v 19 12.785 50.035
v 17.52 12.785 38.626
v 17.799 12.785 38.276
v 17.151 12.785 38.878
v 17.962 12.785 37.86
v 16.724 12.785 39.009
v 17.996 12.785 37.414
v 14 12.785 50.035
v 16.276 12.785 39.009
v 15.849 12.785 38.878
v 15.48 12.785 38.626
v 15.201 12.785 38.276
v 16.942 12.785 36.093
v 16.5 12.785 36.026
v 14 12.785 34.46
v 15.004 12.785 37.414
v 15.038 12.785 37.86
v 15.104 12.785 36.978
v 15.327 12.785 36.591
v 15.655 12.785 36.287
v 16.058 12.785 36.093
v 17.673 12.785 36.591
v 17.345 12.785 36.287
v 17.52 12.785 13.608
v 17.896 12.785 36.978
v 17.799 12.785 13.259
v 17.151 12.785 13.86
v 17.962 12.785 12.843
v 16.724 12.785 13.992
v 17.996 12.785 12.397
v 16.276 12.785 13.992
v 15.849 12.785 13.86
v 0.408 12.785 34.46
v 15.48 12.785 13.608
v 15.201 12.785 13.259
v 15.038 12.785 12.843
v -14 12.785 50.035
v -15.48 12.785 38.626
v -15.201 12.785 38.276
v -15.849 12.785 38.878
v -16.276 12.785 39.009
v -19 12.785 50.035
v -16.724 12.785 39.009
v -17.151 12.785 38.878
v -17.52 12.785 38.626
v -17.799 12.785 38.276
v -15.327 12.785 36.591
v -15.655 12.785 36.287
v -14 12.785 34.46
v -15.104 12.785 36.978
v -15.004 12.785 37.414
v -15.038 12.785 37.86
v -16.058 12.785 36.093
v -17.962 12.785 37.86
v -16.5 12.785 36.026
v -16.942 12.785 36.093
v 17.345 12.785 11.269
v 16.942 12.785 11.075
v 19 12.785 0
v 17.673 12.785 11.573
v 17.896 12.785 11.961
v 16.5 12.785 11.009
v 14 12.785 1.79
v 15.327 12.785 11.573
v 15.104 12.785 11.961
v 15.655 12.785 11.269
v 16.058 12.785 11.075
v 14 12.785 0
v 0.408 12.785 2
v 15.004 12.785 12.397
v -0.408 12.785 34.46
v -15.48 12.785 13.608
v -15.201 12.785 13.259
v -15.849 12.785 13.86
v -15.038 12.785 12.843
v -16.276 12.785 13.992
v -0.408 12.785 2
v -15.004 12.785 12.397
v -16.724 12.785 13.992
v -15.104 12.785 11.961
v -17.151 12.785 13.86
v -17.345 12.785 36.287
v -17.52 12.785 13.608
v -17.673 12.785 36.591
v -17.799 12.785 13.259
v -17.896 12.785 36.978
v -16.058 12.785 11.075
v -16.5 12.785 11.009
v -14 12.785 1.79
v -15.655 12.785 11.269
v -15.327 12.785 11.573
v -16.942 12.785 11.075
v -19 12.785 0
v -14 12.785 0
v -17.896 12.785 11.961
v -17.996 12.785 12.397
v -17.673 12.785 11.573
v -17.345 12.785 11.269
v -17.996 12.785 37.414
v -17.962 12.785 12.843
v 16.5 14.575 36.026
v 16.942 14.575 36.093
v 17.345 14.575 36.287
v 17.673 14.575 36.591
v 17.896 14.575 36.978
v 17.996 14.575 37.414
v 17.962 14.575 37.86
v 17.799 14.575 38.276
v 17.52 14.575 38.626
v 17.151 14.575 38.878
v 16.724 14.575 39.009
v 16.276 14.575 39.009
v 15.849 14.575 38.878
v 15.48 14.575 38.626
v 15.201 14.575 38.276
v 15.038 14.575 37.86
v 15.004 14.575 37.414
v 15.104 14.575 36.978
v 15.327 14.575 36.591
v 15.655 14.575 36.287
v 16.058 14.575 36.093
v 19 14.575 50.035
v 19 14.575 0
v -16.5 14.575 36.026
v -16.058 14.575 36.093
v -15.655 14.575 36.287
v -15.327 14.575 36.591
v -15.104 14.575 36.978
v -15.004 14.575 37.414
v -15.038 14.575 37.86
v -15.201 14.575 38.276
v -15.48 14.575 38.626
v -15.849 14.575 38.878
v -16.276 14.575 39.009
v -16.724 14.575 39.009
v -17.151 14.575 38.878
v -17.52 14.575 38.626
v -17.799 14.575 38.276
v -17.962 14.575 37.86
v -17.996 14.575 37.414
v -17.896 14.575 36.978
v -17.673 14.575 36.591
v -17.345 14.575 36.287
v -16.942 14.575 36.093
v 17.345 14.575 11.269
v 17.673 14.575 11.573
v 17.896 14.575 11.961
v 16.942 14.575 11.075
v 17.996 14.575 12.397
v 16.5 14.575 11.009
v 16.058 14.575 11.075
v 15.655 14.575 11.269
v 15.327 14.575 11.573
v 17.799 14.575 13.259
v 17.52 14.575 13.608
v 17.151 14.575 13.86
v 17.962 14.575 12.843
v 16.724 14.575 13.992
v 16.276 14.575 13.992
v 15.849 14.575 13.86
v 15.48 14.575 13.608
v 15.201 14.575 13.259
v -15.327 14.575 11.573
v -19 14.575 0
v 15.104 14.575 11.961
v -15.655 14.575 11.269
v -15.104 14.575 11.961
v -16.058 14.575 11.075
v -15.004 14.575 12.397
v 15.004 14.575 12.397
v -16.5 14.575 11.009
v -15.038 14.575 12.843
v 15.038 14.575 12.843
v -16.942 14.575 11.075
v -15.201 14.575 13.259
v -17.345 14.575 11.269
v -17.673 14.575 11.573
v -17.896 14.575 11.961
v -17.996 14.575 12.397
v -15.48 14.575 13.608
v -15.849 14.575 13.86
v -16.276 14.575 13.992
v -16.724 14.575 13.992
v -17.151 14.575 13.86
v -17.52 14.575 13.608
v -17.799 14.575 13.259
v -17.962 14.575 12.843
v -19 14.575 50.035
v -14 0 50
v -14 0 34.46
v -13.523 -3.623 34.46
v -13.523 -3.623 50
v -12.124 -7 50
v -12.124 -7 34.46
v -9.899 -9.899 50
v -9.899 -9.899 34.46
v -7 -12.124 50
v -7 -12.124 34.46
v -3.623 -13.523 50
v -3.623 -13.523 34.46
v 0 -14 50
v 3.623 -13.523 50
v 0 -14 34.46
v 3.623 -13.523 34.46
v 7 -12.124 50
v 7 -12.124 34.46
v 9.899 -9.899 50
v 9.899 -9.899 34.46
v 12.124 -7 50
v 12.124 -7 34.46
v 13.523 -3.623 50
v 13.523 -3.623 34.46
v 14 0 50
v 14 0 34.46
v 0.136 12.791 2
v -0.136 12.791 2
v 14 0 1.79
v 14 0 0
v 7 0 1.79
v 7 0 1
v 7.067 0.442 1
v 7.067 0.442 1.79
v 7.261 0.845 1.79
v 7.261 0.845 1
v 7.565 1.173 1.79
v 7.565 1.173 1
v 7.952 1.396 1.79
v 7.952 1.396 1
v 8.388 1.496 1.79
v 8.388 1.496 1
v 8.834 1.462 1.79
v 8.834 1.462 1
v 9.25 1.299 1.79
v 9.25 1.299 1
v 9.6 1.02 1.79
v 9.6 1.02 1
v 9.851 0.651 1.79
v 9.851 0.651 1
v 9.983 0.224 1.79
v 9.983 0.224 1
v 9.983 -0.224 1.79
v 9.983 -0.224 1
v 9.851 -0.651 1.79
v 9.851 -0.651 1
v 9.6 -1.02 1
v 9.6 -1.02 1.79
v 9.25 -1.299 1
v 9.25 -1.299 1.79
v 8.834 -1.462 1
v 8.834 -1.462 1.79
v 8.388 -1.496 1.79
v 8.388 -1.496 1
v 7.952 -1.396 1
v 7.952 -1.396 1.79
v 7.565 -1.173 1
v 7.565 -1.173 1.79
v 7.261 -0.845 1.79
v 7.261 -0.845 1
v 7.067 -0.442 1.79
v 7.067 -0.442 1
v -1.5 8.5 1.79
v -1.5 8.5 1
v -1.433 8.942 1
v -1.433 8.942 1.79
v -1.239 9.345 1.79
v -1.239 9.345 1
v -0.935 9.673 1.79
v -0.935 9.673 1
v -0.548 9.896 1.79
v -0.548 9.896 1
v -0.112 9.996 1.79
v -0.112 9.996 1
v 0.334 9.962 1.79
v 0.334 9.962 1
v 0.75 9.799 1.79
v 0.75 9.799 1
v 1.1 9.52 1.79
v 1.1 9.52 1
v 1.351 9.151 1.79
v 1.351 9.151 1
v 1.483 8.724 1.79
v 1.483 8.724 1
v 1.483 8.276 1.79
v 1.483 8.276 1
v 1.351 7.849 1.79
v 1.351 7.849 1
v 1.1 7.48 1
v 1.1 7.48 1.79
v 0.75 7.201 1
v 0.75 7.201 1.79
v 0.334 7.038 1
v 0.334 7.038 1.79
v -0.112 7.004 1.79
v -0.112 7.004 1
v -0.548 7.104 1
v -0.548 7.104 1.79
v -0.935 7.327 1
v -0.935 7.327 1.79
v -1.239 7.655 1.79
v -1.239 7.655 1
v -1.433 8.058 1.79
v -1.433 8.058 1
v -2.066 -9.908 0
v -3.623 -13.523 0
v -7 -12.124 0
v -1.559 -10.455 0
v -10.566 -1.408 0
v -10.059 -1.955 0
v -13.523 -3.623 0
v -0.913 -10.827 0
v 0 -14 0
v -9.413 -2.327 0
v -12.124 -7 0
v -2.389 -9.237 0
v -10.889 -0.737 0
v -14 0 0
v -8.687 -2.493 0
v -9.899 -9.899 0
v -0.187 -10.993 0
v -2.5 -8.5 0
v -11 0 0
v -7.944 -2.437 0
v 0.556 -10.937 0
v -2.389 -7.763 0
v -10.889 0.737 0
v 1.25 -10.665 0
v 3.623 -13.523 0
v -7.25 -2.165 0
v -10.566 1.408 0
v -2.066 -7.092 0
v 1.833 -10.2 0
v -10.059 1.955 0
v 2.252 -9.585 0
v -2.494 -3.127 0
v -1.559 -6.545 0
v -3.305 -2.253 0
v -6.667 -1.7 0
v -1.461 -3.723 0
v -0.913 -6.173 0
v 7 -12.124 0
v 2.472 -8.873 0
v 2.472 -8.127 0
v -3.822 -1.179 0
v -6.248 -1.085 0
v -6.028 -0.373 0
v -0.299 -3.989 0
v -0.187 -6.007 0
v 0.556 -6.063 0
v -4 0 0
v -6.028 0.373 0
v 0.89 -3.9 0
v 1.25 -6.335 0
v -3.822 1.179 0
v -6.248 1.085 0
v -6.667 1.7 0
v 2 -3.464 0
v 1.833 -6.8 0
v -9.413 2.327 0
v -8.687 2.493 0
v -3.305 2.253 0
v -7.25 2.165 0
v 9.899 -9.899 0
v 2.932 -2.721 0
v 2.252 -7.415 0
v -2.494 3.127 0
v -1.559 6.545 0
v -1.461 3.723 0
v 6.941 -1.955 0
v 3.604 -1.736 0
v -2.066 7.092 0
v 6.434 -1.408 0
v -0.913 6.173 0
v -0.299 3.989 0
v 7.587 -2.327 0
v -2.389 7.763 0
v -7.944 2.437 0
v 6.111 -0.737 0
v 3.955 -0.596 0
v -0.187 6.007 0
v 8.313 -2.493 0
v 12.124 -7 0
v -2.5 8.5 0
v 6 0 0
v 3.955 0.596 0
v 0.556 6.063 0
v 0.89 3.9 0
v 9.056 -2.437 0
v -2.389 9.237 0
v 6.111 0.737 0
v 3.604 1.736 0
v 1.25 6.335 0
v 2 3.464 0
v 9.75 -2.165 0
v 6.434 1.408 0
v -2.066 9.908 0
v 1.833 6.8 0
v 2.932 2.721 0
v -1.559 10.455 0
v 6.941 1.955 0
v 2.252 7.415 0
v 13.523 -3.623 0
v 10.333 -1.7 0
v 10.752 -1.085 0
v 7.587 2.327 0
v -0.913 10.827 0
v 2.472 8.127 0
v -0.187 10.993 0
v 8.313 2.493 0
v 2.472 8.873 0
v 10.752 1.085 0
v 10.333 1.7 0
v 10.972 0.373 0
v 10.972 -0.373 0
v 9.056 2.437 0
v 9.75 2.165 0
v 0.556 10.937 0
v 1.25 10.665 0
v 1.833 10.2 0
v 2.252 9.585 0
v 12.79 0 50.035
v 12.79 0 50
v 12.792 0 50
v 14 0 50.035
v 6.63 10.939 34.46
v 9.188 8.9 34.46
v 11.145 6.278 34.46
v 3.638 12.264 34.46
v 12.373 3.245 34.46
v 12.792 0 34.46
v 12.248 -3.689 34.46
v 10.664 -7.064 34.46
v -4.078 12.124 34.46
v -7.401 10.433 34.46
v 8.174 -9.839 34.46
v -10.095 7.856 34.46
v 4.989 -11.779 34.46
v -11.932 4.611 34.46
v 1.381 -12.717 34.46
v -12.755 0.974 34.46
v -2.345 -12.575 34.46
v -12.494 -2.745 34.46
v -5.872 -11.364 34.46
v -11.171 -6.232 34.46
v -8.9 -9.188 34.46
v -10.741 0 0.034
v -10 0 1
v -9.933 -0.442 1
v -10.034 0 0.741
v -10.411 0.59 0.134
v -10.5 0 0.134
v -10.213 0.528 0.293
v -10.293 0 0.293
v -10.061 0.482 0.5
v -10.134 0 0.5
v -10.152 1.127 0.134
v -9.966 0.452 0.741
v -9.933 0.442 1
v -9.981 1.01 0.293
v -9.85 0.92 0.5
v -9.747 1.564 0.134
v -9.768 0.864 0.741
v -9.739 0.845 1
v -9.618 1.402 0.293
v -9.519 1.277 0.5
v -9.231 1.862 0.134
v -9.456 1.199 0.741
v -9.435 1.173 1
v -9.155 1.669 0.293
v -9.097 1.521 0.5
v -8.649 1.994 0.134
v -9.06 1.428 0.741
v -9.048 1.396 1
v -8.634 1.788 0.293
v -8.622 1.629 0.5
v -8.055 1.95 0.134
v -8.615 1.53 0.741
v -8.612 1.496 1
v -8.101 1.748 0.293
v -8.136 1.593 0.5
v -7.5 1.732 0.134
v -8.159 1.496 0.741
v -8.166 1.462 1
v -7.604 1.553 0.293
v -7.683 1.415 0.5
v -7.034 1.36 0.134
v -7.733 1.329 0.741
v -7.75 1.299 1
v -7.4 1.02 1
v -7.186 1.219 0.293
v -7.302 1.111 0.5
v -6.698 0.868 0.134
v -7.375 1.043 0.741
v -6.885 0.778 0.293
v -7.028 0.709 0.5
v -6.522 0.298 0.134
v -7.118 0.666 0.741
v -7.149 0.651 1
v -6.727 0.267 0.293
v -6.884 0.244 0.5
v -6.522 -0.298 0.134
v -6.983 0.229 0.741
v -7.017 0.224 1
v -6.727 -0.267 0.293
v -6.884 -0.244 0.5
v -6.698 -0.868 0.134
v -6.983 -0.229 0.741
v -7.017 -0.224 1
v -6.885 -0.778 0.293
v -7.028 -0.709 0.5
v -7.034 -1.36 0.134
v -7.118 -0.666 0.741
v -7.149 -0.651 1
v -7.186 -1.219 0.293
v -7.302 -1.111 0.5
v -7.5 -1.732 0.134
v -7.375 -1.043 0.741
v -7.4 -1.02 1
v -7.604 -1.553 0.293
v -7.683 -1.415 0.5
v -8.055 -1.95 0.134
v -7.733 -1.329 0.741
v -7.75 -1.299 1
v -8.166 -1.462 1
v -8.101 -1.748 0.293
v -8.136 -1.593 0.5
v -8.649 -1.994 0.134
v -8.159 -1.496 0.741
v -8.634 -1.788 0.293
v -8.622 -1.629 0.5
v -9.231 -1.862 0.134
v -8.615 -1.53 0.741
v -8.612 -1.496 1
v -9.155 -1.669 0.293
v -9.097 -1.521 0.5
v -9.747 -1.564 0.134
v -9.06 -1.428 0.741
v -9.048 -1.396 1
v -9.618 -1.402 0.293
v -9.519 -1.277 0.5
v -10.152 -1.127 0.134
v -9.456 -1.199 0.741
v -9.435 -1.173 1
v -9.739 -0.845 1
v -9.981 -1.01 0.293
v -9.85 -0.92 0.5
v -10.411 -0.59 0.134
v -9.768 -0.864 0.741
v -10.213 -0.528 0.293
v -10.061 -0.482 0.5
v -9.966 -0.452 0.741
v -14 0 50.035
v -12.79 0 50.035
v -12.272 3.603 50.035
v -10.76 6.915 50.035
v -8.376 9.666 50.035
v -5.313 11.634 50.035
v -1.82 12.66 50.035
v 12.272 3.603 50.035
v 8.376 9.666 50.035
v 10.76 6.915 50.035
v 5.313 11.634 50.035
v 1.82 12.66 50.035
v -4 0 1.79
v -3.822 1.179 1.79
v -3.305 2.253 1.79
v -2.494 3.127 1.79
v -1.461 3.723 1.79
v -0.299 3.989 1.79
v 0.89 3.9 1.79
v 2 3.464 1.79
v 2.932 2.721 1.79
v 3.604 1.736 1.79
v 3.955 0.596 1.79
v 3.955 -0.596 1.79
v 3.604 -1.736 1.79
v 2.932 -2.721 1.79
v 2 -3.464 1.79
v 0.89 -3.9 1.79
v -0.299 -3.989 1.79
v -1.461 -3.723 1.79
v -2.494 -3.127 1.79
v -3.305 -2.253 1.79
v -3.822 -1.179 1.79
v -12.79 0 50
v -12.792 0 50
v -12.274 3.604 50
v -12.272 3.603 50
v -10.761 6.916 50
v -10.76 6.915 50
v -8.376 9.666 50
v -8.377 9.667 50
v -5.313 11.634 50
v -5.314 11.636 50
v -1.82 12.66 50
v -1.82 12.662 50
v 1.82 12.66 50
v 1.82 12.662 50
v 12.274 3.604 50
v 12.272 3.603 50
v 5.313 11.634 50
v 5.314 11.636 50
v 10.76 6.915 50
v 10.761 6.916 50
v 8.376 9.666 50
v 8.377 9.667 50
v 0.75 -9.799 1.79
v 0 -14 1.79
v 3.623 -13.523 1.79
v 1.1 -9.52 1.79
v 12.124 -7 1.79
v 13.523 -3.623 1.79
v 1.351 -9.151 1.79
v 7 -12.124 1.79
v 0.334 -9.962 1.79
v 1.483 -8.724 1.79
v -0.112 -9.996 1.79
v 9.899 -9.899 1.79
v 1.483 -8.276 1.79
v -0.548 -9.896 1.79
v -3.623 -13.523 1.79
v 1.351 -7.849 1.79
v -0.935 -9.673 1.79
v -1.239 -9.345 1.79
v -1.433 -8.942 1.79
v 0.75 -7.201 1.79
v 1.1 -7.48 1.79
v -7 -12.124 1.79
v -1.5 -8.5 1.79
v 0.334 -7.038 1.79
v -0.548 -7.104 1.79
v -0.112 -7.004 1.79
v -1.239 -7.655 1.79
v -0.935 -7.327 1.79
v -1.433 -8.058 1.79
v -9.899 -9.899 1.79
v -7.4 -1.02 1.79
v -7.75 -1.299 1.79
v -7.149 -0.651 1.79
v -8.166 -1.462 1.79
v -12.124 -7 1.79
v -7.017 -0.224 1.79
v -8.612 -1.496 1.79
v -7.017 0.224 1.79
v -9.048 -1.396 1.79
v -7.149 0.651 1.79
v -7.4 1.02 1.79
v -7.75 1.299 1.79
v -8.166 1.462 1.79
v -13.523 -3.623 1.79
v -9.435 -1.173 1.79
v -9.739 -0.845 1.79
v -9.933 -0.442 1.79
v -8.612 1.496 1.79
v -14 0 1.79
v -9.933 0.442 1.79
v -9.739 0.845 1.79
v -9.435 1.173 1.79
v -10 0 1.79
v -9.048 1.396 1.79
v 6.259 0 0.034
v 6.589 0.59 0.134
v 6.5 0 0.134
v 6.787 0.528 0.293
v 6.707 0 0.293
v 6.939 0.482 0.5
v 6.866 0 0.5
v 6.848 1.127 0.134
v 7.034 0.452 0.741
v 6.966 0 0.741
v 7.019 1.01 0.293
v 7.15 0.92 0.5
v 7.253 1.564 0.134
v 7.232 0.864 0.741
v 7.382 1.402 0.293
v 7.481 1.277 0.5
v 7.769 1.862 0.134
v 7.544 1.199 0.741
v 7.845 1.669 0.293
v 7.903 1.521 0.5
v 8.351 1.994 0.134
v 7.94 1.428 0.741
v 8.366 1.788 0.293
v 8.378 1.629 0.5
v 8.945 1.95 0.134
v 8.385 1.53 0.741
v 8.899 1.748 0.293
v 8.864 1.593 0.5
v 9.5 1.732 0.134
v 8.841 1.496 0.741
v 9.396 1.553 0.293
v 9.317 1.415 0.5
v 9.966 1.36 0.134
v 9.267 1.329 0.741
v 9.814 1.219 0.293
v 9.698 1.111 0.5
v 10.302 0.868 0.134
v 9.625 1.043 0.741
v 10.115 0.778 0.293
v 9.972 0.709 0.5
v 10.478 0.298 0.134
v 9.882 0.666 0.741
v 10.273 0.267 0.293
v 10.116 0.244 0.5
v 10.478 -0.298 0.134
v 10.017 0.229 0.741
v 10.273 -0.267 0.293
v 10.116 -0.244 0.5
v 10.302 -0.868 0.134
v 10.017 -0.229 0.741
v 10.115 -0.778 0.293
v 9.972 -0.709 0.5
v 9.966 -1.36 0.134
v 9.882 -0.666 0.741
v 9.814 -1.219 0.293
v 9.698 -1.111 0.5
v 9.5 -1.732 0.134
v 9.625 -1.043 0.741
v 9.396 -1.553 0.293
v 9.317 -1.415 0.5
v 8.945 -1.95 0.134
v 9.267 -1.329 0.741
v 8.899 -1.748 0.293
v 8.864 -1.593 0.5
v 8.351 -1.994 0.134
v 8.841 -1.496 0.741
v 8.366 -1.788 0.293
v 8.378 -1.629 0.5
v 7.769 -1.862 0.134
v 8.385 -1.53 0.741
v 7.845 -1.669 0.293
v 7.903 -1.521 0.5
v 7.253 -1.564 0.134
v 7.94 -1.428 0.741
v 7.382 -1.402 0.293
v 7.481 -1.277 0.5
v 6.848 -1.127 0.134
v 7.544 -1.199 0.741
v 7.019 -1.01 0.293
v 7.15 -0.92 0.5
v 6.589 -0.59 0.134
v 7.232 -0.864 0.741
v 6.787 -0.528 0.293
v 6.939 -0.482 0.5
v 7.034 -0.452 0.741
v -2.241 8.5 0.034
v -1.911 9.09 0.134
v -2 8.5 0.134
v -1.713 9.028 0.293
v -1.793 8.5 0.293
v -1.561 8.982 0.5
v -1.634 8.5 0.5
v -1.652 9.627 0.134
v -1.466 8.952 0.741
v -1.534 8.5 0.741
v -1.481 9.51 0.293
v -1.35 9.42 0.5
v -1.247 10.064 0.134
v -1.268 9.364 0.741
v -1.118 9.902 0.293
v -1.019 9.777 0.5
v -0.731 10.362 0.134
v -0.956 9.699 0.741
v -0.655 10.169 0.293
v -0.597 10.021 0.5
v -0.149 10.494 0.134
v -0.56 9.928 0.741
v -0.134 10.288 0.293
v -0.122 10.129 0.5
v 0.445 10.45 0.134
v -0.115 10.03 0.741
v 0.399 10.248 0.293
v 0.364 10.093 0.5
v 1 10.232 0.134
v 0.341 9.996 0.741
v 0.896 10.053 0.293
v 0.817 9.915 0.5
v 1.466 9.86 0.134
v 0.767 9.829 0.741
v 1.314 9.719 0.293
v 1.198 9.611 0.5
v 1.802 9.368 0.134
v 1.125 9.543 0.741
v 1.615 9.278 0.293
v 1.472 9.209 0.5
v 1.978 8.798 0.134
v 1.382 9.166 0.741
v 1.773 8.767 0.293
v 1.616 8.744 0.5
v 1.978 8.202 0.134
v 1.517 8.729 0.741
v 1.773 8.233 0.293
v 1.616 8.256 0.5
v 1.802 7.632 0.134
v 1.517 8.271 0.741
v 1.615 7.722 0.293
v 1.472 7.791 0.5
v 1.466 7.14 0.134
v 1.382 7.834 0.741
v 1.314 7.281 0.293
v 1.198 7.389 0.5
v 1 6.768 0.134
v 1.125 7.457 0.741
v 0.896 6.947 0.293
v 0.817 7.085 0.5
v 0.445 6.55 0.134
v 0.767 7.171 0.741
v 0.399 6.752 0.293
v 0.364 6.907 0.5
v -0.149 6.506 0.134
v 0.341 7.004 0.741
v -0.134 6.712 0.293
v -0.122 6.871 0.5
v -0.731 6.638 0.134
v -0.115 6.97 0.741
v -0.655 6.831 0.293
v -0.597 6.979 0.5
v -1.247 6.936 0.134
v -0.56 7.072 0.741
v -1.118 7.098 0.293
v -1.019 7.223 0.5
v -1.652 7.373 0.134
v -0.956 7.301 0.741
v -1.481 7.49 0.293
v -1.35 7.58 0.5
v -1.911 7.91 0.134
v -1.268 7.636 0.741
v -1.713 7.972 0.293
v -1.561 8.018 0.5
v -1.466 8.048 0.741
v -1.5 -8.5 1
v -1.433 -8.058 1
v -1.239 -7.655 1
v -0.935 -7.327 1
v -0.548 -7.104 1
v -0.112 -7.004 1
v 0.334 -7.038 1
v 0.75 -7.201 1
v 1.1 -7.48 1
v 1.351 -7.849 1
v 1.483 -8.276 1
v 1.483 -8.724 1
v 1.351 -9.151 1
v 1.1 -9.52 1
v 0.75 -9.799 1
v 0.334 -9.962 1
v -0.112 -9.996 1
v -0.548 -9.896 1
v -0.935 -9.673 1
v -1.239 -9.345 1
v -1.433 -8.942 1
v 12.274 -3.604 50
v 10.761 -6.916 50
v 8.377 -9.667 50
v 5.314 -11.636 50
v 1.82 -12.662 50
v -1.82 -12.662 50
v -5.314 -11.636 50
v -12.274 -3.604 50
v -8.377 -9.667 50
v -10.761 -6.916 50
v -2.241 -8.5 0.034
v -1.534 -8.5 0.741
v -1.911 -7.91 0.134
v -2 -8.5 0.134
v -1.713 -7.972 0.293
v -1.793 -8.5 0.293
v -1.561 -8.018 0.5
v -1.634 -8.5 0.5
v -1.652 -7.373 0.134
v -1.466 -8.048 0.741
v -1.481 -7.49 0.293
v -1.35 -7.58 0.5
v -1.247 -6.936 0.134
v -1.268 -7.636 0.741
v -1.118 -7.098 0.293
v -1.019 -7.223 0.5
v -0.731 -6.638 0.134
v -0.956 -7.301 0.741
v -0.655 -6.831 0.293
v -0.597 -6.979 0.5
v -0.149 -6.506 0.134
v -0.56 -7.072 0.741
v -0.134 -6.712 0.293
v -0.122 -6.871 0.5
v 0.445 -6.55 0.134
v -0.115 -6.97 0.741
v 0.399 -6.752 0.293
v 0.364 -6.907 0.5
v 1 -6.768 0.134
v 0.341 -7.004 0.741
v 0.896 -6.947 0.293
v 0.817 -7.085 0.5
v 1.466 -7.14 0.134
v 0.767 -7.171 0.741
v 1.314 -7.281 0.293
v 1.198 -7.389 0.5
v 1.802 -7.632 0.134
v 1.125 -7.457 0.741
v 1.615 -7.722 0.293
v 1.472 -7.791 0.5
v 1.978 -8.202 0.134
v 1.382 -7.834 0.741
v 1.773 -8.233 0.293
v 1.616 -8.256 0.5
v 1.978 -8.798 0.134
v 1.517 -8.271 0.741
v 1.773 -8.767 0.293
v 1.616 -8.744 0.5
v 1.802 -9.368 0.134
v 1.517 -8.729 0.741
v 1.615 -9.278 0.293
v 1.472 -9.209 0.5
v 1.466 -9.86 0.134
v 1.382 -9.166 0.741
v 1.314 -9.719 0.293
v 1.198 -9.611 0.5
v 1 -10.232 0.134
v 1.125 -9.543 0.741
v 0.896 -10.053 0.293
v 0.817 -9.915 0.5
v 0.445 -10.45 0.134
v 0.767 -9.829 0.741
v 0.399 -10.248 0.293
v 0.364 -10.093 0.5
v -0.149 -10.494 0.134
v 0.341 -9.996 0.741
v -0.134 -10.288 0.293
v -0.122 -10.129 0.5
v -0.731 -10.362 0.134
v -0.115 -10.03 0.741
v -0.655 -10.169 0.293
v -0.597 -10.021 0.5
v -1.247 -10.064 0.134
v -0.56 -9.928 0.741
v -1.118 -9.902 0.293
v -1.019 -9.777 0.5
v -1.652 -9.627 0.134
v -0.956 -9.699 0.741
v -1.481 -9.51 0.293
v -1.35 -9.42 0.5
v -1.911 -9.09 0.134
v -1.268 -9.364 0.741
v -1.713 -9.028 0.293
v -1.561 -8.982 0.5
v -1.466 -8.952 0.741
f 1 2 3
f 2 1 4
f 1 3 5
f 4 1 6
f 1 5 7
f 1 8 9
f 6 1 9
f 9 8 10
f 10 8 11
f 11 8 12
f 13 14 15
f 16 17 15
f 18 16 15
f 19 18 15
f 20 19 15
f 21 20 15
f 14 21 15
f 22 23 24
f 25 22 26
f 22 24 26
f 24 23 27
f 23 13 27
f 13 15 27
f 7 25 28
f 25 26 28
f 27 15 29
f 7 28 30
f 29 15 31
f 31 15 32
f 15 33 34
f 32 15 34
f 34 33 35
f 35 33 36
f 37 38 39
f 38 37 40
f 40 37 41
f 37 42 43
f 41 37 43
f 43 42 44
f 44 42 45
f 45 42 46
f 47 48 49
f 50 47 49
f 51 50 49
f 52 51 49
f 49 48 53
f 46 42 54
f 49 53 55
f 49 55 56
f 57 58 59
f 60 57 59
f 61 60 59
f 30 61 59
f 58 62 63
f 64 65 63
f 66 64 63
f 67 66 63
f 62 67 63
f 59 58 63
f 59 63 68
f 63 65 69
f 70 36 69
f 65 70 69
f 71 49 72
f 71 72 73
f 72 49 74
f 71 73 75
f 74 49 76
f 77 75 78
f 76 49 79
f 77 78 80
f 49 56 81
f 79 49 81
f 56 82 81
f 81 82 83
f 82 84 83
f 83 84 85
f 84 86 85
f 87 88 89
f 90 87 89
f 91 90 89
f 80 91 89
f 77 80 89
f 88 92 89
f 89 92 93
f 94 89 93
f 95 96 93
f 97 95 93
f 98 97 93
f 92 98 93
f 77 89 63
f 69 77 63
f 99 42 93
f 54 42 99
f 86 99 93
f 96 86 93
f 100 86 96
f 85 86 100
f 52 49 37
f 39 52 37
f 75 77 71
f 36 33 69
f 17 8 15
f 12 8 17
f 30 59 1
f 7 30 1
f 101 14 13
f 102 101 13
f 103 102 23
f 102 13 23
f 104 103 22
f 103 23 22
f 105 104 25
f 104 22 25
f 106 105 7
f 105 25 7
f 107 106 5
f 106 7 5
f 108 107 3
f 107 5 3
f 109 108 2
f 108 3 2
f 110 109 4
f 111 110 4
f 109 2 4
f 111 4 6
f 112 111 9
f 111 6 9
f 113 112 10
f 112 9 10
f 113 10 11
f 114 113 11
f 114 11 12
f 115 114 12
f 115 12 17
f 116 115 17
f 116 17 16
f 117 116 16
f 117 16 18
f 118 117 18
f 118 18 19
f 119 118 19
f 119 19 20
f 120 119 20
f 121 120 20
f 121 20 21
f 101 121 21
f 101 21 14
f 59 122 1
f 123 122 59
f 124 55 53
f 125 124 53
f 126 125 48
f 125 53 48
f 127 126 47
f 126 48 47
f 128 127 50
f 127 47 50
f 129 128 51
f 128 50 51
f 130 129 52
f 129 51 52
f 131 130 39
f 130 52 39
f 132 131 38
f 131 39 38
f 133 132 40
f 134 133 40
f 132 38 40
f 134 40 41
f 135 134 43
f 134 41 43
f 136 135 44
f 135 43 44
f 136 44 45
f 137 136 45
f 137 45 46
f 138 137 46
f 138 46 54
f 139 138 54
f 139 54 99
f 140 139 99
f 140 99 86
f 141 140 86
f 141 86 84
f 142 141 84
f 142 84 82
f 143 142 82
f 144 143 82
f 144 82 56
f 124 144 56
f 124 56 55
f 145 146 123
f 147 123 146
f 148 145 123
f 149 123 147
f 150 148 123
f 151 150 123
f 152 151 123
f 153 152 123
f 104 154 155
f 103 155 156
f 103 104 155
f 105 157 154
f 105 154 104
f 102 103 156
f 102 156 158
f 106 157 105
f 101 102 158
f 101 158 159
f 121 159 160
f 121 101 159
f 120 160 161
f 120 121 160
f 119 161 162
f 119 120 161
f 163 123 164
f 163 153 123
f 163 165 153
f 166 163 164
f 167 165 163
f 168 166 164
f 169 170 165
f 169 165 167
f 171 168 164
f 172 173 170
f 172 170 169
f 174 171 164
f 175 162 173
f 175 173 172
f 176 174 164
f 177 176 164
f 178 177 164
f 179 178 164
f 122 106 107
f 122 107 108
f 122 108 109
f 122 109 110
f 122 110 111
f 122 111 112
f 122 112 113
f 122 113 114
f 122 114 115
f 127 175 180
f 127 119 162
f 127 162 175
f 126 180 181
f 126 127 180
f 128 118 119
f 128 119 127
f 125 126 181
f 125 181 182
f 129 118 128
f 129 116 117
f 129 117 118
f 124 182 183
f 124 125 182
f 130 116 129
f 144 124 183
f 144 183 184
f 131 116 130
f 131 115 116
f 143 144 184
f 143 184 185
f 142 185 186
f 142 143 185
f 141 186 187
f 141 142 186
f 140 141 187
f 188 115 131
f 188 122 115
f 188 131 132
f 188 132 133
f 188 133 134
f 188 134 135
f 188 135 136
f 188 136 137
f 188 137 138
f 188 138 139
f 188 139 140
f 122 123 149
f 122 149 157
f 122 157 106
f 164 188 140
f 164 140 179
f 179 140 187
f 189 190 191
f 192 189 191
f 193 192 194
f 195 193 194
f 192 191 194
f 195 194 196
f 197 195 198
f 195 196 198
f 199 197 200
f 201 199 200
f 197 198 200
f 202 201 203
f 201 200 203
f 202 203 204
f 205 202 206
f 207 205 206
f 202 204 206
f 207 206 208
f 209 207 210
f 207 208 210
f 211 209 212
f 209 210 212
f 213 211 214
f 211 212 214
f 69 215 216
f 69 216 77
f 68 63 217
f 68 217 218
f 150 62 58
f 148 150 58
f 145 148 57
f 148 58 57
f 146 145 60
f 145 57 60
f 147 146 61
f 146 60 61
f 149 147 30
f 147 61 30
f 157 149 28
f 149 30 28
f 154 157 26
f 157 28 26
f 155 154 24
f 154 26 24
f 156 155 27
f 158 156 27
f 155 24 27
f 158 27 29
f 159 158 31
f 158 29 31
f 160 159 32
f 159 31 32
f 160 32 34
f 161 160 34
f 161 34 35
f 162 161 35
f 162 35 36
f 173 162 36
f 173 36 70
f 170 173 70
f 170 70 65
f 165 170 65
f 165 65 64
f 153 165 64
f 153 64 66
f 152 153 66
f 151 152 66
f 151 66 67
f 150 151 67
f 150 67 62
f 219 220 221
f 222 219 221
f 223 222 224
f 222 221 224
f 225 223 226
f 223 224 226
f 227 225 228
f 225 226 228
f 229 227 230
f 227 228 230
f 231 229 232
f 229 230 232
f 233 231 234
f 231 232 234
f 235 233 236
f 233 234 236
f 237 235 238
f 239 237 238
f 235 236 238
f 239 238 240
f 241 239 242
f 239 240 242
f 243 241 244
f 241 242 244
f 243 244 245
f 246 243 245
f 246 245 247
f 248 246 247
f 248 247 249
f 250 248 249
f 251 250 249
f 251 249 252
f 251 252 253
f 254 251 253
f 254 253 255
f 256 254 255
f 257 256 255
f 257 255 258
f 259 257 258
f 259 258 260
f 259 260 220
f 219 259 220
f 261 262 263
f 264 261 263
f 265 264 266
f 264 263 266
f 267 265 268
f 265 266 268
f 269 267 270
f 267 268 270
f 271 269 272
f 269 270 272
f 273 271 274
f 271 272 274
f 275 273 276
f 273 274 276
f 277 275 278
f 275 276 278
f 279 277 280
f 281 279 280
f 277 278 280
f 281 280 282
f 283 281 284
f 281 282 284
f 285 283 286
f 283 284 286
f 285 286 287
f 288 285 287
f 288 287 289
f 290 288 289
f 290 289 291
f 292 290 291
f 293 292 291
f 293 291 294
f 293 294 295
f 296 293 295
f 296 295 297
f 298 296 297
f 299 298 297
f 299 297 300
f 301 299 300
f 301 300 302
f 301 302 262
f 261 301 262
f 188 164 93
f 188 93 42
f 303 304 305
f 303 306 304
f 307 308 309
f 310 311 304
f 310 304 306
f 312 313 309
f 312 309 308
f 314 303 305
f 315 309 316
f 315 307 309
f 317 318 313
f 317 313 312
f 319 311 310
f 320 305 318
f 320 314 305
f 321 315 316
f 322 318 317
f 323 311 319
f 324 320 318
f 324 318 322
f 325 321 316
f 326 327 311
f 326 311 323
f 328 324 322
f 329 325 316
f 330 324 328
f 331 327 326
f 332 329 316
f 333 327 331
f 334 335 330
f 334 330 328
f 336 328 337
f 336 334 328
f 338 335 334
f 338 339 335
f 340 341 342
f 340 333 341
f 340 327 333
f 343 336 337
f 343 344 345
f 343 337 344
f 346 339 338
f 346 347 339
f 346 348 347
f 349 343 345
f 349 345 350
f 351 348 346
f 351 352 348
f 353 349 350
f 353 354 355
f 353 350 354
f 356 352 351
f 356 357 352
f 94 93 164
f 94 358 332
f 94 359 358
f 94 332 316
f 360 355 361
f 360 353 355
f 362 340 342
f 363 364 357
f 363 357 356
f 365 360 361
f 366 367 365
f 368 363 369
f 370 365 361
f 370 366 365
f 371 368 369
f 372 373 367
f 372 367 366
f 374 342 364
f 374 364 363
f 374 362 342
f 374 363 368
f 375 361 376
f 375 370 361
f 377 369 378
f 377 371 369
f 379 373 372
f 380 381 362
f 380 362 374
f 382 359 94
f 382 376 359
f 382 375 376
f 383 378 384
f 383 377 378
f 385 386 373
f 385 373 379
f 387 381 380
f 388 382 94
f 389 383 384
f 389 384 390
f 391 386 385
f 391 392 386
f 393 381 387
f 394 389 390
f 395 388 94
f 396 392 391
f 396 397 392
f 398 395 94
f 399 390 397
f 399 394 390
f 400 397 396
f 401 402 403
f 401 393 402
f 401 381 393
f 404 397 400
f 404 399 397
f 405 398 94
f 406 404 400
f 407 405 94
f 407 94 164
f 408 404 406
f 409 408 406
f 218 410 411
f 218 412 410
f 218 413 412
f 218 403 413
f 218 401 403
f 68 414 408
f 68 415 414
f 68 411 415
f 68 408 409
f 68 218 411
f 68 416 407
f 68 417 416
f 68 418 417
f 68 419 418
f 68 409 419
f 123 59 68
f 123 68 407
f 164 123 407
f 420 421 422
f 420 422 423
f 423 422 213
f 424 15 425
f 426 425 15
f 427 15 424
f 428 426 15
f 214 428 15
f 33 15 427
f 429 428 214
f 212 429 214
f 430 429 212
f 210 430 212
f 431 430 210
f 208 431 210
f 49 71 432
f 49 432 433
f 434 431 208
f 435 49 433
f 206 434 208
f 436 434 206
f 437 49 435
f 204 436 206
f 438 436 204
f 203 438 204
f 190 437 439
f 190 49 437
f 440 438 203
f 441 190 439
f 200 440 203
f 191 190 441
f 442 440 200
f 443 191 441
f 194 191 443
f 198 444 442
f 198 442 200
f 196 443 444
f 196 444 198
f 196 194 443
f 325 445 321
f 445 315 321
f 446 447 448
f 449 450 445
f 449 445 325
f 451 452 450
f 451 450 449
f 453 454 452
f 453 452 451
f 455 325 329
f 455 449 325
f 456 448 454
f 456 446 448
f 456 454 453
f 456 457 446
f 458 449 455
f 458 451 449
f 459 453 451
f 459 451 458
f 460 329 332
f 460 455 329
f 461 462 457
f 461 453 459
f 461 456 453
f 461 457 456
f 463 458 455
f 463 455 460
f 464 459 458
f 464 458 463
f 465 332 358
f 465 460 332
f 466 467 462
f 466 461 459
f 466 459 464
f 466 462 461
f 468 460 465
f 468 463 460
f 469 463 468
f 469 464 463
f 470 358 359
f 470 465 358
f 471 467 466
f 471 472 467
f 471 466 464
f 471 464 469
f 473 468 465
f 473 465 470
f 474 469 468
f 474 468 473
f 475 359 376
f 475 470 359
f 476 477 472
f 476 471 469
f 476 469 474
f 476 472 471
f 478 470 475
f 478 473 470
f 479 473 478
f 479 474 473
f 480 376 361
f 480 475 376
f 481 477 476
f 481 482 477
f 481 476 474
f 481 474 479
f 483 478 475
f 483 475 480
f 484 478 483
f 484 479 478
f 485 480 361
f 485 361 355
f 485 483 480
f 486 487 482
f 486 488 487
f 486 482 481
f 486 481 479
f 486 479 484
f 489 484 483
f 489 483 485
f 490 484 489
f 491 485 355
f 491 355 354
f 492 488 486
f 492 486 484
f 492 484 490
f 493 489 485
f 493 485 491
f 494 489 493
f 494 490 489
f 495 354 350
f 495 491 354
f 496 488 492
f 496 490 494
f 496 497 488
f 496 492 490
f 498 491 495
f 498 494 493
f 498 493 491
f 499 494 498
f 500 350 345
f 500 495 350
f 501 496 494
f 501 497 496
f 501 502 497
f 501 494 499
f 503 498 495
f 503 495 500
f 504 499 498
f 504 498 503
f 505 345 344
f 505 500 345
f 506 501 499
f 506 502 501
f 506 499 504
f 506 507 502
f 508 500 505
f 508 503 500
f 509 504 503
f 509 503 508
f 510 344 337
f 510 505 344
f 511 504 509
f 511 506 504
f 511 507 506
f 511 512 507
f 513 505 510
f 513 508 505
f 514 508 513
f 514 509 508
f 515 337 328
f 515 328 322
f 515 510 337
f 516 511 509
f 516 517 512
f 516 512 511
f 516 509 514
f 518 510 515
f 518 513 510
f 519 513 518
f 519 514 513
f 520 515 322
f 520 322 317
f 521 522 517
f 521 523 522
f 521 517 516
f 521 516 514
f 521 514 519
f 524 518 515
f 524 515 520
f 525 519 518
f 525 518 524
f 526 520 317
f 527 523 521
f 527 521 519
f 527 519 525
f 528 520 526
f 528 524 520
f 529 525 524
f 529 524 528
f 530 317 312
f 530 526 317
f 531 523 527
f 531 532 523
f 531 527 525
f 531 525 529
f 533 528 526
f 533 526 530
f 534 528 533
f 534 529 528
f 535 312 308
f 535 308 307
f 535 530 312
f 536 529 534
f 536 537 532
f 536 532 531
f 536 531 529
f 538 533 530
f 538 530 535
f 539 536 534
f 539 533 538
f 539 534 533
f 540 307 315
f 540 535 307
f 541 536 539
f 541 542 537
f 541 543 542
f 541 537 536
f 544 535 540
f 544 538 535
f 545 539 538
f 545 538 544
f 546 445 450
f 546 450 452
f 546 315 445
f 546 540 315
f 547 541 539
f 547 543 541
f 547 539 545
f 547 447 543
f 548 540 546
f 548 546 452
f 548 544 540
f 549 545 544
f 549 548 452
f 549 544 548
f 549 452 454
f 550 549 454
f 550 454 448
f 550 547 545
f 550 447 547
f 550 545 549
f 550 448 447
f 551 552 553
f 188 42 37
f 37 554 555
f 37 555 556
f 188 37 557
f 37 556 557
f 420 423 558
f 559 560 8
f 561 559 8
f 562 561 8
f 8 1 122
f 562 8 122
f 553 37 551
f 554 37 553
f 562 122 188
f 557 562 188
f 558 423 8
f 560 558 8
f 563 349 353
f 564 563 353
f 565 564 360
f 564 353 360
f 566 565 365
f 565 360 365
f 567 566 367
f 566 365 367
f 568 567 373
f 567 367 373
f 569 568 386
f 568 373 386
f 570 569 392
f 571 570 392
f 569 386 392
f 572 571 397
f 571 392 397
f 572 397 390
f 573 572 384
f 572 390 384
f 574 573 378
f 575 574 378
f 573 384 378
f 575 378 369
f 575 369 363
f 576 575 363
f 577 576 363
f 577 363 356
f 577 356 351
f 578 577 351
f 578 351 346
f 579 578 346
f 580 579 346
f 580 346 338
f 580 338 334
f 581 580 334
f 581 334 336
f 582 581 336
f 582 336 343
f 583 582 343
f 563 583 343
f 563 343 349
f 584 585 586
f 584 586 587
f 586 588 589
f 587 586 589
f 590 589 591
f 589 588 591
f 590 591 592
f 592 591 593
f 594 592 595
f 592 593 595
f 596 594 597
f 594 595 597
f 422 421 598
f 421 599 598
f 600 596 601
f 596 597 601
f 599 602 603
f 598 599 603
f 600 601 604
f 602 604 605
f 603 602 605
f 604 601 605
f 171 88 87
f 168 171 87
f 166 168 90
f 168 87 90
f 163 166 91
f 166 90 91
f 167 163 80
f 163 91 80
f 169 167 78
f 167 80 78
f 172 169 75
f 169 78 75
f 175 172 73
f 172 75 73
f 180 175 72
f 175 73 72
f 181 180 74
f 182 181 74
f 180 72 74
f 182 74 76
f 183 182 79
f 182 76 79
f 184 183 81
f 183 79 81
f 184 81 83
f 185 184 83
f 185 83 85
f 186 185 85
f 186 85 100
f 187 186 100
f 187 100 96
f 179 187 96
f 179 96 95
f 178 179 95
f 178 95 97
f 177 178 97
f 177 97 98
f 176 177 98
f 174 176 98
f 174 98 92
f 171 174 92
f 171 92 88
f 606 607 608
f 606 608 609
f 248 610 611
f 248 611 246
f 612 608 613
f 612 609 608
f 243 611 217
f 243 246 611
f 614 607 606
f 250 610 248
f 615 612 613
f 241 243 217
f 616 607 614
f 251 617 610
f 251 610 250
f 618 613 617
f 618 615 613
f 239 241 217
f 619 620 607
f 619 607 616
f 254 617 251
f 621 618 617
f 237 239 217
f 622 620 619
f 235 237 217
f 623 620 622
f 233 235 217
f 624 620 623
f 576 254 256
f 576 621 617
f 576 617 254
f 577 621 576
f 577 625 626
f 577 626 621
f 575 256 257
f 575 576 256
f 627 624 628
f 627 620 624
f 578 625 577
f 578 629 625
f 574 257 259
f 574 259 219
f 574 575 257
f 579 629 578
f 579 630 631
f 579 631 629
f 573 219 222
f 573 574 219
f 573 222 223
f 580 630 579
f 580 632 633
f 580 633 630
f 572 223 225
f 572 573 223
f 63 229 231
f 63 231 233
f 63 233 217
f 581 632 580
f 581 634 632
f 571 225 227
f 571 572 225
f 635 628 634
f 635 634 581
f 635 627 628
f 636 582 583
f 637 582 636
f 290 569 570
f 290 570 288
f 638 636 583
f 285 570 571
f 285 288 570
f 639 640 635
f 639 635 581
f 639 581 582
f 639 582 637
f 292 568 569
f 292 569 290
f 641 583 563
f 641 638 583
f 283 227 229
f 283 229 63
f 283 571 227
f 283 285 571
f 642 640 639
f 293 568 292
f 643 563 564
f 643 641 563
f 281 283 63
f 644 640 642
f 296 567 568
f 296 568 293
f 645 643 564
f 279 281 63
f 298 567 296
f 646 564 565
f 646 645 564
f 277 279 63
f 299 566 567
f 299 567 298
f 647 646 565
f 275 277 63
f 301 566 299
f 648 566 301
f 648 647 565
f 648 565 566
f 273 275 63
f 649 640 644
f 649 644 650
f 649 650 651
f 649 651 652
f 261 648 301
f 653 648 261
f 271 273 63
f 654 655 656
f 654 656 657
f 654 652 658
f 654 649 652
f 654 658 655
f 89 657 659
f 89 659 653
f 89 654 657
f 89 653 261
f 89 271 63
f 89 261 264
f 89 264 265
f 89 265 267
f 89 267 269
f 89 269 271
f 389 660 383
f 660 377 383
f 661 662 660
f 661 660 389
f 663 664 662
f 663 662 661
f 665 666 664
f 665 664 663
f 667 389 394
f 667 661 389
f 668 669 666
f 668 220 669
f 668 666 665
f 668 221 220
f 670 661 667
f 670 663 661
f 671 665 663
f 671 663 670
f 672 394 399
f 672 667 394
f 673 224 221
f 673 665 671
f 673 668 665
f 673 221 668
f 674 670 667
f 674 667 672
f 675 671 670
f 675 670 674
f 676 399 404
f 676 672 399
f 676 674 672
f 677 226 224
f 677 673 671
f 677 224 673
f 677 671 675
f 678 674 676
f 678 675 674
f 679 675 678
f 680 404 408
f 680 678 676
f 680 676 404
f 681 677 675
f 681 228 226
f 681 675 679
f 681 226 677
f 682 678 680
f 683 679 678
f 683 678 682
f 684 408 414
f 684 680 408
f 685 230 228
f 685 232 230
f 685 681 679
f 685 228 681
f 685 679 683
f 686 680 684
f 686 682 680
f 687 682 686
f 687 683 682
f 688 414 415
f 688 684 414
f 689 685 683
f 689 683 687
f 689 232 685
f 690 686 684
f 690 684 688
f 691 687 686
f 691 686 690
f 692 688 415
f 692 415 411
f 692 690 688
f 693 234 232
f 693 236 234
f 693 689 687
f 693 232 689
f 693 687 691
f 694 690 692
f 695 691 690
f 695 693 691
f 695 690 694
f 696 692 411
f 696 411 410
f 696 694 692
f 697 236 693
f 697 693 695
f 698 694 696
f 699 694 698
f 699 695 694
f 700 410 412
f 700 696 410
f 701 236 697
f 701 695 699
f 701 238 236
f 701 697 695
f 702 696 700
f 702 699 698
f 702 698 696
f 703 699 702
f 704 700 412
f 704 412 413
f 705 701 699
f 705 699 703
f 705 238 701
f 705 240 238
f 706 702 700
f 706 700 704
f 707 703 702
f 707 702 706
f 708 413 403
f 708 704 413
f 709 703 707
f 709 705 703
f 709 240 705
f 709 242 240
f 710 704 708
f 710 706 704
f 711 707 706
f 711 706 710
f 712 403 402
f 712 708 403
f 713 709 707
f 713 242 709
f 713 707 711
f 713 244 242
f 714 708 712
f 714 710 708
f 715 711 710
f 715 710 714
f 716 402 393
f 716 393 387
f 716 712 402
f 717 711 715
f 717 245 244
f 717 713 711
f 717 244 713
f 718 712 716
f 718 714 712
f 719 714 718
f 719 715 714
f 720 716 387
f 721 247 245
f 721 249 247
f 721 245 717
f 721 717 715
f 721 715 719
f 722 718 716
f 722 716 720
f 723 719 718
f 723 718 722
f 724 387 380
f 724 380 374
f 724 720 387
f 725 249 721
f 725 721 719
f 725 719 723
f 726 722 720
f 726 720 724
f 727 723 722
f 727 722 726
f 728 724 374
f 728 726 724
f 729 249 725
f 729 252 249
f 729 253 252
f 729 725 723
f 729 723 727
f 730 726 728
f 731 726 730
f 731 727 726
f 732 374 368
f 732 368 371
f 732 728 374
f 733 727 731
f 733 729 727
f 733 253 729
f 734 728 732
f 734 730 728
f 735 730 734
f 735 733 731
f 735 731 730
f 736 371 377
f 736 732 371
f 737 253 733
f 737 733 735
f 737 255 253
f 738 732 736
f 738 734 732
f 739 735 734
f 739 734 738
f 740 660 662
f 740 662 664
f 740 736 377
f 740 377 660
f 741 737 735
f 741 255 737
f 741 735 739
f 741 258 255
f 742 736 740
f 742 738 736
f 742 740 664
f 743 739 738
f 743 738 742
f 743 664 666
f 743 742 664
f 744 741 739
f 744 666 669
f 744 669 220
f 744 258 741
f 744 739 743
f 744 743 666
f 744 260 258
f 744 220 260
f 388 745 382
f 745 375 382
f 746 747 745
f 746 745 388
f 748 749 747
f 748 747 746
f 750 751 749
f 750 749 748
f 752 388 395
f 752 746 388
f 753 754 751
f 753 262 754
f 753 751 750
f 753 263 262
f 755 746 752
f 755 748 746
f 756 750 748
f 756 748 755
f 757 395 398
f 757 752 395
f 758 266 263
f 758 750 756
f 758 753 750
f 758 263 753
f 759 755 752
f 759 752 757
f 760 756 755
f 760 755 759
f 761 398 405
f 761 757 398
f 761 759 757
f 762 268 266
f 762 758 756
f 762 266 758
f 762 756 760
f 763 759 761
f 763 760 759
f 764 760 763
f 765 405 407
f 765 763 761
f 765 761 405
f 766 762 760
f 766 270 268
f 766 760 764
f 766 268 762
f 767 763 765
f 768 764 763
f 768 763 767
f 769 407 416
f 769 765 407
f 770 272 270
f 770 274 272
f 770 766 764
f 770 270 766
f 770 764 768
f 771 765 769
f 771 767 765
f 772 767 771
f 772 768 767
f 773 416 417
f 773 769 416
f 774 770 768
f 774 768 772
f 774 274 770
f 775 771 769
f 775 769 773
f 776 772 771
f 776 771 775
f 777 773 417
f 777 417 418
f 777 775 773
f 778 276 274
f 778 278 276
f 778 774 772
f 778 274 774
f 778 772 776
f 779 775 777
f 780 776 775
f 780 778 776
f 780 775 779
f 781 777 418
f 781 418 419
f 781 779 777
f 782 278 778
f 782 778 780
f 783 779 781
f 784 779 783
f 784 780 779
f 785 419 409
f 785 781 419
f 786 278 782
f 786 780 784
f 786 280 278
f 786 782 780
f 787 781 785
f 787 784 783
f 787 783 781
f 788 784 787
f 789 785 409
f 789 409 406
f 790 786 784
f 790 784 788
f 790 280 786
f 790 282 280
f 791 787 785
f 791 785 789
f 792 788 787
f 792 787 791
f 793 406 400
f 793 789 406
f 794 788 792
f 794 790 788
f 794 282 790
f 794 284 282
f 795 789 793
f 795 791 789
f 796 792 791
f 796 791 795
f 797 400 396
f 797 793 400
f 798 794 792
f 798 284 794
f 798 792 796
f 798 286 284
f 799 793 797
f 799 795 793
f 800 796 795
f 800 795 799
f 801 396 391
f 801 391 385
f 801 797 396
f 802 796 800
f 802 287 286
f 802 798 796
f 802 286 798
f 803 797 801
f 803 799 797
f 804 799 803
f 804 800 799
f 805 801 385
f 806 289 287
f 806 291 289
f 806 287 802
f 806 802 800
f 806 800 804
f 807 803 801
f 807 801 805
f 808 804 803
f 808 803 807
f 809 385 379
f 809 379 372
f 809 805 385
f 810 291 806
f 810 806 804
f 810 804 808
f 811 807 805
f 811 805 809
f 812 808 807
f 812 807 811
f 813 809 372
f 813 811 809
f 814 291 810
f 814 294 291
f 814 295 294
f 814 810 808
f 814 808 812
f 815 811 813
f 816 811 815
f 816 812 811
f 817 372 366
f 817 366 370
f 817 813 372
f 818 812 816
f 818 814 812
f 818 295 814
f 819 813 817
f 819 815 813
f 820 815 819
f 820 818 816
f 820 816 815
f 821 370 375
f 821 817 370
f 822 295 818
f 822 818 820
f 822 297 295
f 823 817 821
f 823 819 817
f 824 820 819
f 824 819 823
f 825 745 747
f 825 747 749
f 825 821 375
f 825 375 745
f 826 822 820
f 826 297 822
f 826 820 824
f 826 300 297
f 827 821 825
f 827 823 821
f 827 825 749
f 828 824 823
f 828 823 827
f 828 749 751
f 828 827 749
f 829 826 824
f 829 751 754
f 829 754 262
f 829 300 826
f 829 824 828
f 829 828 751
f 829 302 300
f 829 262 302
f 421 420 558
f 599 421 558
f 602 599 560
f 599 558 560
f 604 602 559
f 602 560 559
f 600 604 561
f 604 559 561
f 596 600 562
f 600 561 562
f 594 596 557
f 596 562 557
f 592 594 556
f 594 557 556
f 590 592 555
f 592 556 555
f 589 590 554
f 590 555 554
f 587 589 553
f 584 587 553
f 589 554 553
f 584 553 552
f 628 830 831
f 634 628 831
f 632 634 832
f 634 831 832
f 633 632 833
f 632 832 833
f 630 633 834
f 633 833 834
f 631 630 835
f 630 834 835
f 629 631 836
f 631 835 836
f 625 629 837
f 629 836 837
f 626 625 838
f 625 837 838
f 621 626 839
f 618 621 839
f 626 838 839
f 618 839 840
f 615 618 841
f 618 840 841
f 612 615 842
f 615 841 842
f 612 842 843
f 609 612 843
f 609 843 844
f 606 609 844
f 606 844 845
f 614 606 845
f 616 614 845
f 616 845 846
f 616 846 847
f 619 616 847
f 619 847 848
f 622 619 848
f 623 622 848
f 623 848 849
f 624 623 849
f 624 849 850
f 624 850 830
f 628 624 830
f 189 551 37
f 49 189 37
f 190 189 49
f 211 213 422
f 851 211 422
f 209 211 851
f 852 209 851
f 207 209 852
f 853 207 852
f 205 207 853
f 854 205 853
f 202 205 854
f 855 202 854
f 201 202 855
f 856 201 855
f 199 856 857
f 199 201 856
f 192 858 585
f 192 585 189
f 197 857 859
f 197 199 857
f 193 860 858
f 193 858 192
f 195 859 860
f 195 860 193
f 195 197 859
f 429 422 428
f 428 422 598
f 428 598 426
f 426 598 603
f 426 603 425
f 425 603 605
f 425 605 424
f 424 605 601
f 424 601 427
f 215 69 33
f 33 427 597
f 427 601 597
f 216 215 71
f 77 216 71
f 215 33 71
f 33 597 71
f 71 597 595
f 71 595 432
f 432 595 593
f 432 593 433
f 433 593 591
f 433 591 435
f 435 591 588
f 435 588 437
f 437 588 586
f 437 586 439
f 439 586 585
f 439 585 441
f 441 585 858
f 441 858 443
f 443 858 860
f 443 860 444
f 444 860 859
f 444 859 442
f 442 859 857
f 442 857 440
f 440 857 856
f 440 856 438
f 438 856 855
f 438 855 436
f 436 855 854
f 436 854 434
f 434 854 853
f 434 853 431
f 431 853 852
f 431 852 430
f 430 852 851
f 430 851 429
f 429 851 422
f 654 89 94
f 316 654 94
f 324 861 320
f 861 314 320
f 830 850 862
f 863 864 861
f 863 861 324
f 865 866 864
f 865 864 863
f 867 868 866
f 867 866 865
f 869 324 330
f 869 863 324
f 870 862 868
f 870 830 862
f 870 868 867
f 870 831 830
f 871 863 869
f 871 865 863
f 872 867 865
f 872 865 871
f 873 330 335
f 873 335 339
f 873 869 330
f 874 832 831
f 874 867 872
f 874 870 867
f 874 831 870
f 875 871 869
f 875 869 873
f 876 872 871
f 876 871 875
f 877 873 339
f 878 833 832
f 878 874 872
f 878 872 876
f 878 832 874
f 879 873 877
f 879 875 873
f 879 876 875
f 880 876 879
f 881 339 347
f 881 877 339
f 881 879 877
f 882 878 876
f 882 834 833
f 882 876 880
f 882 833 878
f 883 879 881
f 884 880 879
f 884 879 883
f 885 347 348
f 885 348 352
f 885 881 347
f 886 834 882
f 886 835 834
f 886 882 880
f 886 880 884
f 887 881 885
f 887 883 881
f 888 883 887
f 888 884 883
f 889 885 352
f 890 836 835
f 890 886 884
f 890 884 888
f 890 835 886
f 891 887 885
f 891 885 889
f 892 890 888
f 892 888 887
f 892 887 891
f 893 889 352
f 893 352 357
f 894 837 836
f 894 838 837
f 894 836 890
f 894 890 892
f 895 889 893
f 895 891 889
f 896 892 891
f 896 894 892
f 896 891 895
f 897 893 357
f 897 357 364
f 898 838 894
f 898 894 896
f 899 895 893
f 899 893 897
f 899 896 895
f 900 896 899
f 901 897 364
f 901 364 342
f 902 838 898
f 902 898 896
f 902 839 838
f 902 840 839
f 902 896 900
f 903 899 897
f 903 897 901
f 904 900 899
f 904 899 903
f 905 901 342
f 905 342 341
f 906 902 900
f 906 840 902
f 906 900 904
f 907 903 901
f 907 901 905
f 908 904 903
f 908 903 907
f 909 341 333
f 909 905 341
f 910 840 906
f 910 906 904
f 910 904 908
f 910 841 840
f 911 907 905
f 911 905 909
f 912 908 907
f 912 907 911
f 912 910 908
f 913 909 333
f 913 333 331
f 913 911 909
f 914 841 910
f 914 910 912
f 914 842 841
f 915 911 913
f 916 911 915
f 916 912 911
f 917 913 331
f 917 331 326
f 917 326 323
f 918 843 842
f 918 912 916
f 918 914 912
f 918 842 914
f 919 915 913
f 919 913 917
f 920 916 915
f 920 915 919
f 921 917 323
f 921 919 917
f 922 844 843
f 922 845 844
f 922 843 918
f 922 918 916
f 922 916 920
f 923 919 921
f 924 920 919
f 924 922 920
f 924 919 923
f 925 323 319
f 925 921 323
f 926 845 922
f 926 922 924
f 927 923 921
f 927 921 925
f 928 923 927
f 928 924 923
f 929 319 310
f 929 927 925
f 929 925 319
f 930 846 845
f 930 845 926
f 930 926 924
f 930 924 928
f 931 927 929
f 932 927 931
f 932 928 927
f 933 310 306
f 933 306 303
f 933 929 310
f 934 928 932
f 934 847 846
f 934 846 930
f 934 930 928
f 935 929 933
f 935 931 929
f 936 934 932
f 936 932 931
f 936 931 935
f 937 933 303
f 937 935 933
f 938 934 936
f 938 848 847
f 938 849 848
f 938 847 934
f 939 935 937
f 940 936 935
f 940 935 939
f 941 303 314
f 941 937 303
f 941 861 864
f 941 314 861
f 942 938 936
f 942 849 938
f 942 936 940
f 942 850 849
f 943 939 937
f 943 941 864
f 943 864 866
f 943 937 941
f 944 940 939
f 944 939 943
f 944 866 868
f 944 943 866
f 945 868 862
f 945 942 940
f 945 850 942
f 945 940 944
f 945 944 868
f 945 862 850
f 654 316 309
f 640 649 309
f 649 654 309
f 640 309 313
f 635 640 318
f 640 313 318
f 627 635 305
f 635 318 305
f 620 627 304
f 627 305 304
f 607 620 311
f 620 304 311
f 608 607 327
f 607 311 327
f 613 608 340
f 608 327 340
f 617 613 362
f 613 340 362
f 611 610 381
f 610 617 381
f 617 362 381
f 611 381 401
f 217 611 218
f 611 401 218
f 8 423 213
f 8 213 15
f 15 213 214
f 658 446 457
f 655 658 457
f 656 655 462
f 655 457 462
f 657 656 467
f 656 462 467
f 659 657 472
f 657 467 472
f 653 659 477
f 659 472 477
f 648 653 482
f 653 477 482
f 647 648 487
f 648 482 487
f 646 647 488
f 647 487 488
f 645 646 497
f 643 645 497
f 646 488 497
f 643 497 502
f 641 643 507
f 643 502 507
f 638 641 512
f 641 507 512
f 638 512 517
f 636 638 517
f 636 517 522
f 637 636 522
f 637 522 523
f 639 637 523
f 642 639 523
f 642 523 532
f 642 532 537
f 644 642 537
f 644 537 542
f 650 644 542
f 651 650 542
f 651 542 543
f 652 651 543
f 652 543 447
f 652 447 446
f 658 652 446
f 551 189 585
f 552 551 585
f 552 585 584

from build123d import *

# Parameters (mm, degrees)
SKETCH1_R                = 14
BOSS_EXTRUDE1_DEPTH      = 50
SKETCH5_W                = 28
SKETCH5_H                = 50.034880911
BOSS_EXTRUDE2_DEPTH      = 21
SKETCH2_R                = 12.791811967
CUT_EXTRUDE1_DEPTH       = 48
SKETCH3_R                = 4
CUT_EXTRUDE2_DEPTH       = 49
SKETCH4_R                = 1.5
CUT_EXTRUDE3_DEPTH       = 49
SKETCH6_R                = 12.79
CUT_EXTRUDE5_DEPTH       = 21
SKETCH7_W                = 28
SKETCH7_H                = 4.634699127
CUT_EXTRUDE6_DEPTH       = 53
SKETCH8_W                = 50.034880911
SKETCH8_H                = 3.58
BOSS_EXTRUDE3_DEPTH      = 5
SKETCH13_R               = 1.5
CUT_EXTRUDE7_DEPTH       = 5
SKETCH14_W               = 50.034880911
SKETCH14_H               = 3.58
BOSS_EXTRUDE4_DEPTH      = 5
SKETCH15_R               = 1.5
CUT_EXTRUDE8_DEPTH       = 5
FILLET1_R                = 1
FILLET2_R                = 1
CUT_EXTRUDE9_DEPTH       = 56.96706514
CUT_EXTRUDE9_DEPTH_BACK  = 56.96706514
SKETCH16_W               = 38
SKETCH16_H               = 1.79
CUT_EXTRUDE10_DEPTH      = 62.684104138
CUT_EXTRUDE10_DEPTH_BACK = 62.684104138
SKETCH19_W               = 32.670016371
SKETCH19_H               = 14
SKETCH19_H_2             = 12.785300873


with BuildPart() as part:
    # Sketch1 → Boss-Extrude1 (new body)
    with BuildSketch(Plane.XY):
        with Locations(Location((0, 0, 0), (0, 0, 180))):
            Circle(SKETCH1_R)
    extrude(amount=BOSS_EXTRUDE1_DEPTH)

    # Sketch5 → Boss-Extrude2 (add)
    with BuildSketch(Plane(origin=(0, 0, 0), x_dir=(1, 0, 0), z_dir=(0, 1, 0))):
        with Locations((0, -25.017440456)):
            Rectangle(SKETCH5_W, SKETCH5_H)
    extrude(amount=BOSS_EXTRUDE2_DEPTH)

    # Sketch2 → Cut-Extrude1 (cut)
    with BuildSketch(Plane.XY.offset(50)):
        Circle(SKETCH2_R)
    extrude(amount=-CUT_EXTRUDE1_DEPTH, mode=Mode.SUBTRACT)

    # Sketch3 → Cut-Extrude2 (cut)
    with BuildSketch(Plane(origin=(0, 0, 0), x_dir=(-1, 0, 0), z_dir=(0, 0, -1))):
        Circle(SKETCH3_R)
    extrude(amount=-CUT_EXTRUDE2_DEPTH, mode=Mode.SUBTRACT)

    # Sketch4 → Cut-Extrude3 (cut)
    with BuildSketch(Plane(origin=(0, 0, 0), x_dir=(-1, 0, 0), z_dir=(0, 0, -1))):
        with Locations((0, -8.5)):
            Circle(SKETCH4_R)
        with Locations((0, 8.5)):
            Circle(SKETCH4_R)
        with Locations((8.5, 0)):
            Circle(SKETCH4_R)
        with Locations((-8.5, 0)):
            Circle(SKETCH4_R)
    extrude(amount=-CUT_EXTRUDE3_DEPTH, mode=Mode.SUBTRACT)

    # Sketch6 → Cut-Extrude5 (cut)
    with BuildSketch(Plane.XY.offset(50.034880911)):
        Circle(SKETCH6_R)
    extrude(amount=-CUT_EXTRUDE5_DEPTH, mode=Mode.SUBTRACT)

    # Sketch7 → Cut-Extrude6 (cut)
    with BuildSketch(Plane.XY.offset(50.034880911)):
        with Locations((0, 18.682650437)):
            Rectangle(SKETCH7_W, SKETCH7_H)
    extrude(amount=-CUT_EXTRUDE6_DEPTH, mode=Mode.SUBTRACT)

    # Sketch8 → Boss-Extrude3 (add)
    with BuildSketch(Plane(origin=(14, 0, 0), x_dir=(0, 0, -1), z_dir=(1, 0, 0))):
        with Locations((-25.017440456, 14.575300873)):
            Rectangle(SKETCH8_W, SKETCH8_H)
    extrude(amount=BOSS_EXTRUDE3_DEPTH)

    # Sketch13 → Cut-Extrude7 (cut)
    with BuildSketch(Plane.XZ.offset(-12.785300873)):
        with Locations(Location((16.5, 37.526160683, 0), (0, 0, 270))):
            Circle(SKETCH13_R)
        with Locations(Location((16.5, 12.508720228, 0), (0, 0, 270))):
            Circle(SKETCH13_R)
    extrude(amount=-CUT_EXTRUDE7_DEPTH, mode=Mode.SUBTRACT)

    # Sketch14 → Boss-Extrude4 (add)
    with BuildSketch(Plane.ZY.offset(14)):
        with Locations((25.017440456, 14.575300873)):
            Rectangle(SKETCH14_W, SKETCH14_H)
    extrude(amount=BOSS_EXTRUDE4_DEPTH)

    # Sketch15 → Cut-Extrude8 (cut)
    with BuildSketch(Plane.XZ.offset(-12.785300873)):
        with Locations(Location((-16.5, 12.508720228, 0), (0, 0, 270))):
            Circle(SKETCH15_R)
        with Locations(Location((-16.5, 37.526160683, 0), (0, 0, 270))):
            Circle(SKETCH15_R)
    extrude(amount=-CUT_EXTRUDE8_DEPTH, mode=Mode.SUBTRACT)

    # Fillet1
    fillet1_edges = [part.edges().sort_by_distance(p)[0] for p in [
        (10, 0, 0),
    ]]
    fillet(fillet1_edges, radius=FILLET1_R)

    # Fillet2
    fillet2_edges = [part.edges().sort_by_distance(p)[0] for p in [
        (1.5, -8.5, 0),
        (1.5, 8.5, 0),
        (-7, 0, 0),
    ]]
    fillet(fillet2_edges, radius=FILLET2_R)

    # Sketch16 → Cut-Extrude9 (cut, two sides: drawn at the far end of the back side and taken through both)
    with BuildSketch(Plane(origin=(0, 0, 0), x_dir=(-1, 0, 0), z_dir=(0, 0, -1)).offset(-CUT_EXTRUDE9_DEPTH_BACK)):
        with Locations((0, 15.470300873)):
            Rectangle(SKETCH16_W, SKETCH16_H)
    extrude(amount=CUT_EXTRUDE9_DEPTH + CUT_EXTRUDE9_DEPTH_BACK, mode=Mode.SUBTRACT)

    # Sketch19 → Cut-Extrude10 (cut, two sides: drawn at the far end of the back side and taken through both)
    with BuildSketch(Plane(origin=(14, 0, 0), x_dir=(0, 0, -1), z_dir=(1, 0, 0)).offset(-CUT_EXTRUDE10_DEPTH_BACK)):
        with Locations((-18.125008186, -7)):
            Rectangle(SKETCH19_W, SKETCH19_H)
        with Locations((-18.125008186, 6.392650437)):
            Rectangle(SKETCH19_W, SKETCH19_H_2)
    extrude(amount=CUT_EXTRUDE10_DEPTH + CUT_EXTRUDE10_DEPTH_BACK, mode=Mode.SUBTRACT)


solid = part.part
